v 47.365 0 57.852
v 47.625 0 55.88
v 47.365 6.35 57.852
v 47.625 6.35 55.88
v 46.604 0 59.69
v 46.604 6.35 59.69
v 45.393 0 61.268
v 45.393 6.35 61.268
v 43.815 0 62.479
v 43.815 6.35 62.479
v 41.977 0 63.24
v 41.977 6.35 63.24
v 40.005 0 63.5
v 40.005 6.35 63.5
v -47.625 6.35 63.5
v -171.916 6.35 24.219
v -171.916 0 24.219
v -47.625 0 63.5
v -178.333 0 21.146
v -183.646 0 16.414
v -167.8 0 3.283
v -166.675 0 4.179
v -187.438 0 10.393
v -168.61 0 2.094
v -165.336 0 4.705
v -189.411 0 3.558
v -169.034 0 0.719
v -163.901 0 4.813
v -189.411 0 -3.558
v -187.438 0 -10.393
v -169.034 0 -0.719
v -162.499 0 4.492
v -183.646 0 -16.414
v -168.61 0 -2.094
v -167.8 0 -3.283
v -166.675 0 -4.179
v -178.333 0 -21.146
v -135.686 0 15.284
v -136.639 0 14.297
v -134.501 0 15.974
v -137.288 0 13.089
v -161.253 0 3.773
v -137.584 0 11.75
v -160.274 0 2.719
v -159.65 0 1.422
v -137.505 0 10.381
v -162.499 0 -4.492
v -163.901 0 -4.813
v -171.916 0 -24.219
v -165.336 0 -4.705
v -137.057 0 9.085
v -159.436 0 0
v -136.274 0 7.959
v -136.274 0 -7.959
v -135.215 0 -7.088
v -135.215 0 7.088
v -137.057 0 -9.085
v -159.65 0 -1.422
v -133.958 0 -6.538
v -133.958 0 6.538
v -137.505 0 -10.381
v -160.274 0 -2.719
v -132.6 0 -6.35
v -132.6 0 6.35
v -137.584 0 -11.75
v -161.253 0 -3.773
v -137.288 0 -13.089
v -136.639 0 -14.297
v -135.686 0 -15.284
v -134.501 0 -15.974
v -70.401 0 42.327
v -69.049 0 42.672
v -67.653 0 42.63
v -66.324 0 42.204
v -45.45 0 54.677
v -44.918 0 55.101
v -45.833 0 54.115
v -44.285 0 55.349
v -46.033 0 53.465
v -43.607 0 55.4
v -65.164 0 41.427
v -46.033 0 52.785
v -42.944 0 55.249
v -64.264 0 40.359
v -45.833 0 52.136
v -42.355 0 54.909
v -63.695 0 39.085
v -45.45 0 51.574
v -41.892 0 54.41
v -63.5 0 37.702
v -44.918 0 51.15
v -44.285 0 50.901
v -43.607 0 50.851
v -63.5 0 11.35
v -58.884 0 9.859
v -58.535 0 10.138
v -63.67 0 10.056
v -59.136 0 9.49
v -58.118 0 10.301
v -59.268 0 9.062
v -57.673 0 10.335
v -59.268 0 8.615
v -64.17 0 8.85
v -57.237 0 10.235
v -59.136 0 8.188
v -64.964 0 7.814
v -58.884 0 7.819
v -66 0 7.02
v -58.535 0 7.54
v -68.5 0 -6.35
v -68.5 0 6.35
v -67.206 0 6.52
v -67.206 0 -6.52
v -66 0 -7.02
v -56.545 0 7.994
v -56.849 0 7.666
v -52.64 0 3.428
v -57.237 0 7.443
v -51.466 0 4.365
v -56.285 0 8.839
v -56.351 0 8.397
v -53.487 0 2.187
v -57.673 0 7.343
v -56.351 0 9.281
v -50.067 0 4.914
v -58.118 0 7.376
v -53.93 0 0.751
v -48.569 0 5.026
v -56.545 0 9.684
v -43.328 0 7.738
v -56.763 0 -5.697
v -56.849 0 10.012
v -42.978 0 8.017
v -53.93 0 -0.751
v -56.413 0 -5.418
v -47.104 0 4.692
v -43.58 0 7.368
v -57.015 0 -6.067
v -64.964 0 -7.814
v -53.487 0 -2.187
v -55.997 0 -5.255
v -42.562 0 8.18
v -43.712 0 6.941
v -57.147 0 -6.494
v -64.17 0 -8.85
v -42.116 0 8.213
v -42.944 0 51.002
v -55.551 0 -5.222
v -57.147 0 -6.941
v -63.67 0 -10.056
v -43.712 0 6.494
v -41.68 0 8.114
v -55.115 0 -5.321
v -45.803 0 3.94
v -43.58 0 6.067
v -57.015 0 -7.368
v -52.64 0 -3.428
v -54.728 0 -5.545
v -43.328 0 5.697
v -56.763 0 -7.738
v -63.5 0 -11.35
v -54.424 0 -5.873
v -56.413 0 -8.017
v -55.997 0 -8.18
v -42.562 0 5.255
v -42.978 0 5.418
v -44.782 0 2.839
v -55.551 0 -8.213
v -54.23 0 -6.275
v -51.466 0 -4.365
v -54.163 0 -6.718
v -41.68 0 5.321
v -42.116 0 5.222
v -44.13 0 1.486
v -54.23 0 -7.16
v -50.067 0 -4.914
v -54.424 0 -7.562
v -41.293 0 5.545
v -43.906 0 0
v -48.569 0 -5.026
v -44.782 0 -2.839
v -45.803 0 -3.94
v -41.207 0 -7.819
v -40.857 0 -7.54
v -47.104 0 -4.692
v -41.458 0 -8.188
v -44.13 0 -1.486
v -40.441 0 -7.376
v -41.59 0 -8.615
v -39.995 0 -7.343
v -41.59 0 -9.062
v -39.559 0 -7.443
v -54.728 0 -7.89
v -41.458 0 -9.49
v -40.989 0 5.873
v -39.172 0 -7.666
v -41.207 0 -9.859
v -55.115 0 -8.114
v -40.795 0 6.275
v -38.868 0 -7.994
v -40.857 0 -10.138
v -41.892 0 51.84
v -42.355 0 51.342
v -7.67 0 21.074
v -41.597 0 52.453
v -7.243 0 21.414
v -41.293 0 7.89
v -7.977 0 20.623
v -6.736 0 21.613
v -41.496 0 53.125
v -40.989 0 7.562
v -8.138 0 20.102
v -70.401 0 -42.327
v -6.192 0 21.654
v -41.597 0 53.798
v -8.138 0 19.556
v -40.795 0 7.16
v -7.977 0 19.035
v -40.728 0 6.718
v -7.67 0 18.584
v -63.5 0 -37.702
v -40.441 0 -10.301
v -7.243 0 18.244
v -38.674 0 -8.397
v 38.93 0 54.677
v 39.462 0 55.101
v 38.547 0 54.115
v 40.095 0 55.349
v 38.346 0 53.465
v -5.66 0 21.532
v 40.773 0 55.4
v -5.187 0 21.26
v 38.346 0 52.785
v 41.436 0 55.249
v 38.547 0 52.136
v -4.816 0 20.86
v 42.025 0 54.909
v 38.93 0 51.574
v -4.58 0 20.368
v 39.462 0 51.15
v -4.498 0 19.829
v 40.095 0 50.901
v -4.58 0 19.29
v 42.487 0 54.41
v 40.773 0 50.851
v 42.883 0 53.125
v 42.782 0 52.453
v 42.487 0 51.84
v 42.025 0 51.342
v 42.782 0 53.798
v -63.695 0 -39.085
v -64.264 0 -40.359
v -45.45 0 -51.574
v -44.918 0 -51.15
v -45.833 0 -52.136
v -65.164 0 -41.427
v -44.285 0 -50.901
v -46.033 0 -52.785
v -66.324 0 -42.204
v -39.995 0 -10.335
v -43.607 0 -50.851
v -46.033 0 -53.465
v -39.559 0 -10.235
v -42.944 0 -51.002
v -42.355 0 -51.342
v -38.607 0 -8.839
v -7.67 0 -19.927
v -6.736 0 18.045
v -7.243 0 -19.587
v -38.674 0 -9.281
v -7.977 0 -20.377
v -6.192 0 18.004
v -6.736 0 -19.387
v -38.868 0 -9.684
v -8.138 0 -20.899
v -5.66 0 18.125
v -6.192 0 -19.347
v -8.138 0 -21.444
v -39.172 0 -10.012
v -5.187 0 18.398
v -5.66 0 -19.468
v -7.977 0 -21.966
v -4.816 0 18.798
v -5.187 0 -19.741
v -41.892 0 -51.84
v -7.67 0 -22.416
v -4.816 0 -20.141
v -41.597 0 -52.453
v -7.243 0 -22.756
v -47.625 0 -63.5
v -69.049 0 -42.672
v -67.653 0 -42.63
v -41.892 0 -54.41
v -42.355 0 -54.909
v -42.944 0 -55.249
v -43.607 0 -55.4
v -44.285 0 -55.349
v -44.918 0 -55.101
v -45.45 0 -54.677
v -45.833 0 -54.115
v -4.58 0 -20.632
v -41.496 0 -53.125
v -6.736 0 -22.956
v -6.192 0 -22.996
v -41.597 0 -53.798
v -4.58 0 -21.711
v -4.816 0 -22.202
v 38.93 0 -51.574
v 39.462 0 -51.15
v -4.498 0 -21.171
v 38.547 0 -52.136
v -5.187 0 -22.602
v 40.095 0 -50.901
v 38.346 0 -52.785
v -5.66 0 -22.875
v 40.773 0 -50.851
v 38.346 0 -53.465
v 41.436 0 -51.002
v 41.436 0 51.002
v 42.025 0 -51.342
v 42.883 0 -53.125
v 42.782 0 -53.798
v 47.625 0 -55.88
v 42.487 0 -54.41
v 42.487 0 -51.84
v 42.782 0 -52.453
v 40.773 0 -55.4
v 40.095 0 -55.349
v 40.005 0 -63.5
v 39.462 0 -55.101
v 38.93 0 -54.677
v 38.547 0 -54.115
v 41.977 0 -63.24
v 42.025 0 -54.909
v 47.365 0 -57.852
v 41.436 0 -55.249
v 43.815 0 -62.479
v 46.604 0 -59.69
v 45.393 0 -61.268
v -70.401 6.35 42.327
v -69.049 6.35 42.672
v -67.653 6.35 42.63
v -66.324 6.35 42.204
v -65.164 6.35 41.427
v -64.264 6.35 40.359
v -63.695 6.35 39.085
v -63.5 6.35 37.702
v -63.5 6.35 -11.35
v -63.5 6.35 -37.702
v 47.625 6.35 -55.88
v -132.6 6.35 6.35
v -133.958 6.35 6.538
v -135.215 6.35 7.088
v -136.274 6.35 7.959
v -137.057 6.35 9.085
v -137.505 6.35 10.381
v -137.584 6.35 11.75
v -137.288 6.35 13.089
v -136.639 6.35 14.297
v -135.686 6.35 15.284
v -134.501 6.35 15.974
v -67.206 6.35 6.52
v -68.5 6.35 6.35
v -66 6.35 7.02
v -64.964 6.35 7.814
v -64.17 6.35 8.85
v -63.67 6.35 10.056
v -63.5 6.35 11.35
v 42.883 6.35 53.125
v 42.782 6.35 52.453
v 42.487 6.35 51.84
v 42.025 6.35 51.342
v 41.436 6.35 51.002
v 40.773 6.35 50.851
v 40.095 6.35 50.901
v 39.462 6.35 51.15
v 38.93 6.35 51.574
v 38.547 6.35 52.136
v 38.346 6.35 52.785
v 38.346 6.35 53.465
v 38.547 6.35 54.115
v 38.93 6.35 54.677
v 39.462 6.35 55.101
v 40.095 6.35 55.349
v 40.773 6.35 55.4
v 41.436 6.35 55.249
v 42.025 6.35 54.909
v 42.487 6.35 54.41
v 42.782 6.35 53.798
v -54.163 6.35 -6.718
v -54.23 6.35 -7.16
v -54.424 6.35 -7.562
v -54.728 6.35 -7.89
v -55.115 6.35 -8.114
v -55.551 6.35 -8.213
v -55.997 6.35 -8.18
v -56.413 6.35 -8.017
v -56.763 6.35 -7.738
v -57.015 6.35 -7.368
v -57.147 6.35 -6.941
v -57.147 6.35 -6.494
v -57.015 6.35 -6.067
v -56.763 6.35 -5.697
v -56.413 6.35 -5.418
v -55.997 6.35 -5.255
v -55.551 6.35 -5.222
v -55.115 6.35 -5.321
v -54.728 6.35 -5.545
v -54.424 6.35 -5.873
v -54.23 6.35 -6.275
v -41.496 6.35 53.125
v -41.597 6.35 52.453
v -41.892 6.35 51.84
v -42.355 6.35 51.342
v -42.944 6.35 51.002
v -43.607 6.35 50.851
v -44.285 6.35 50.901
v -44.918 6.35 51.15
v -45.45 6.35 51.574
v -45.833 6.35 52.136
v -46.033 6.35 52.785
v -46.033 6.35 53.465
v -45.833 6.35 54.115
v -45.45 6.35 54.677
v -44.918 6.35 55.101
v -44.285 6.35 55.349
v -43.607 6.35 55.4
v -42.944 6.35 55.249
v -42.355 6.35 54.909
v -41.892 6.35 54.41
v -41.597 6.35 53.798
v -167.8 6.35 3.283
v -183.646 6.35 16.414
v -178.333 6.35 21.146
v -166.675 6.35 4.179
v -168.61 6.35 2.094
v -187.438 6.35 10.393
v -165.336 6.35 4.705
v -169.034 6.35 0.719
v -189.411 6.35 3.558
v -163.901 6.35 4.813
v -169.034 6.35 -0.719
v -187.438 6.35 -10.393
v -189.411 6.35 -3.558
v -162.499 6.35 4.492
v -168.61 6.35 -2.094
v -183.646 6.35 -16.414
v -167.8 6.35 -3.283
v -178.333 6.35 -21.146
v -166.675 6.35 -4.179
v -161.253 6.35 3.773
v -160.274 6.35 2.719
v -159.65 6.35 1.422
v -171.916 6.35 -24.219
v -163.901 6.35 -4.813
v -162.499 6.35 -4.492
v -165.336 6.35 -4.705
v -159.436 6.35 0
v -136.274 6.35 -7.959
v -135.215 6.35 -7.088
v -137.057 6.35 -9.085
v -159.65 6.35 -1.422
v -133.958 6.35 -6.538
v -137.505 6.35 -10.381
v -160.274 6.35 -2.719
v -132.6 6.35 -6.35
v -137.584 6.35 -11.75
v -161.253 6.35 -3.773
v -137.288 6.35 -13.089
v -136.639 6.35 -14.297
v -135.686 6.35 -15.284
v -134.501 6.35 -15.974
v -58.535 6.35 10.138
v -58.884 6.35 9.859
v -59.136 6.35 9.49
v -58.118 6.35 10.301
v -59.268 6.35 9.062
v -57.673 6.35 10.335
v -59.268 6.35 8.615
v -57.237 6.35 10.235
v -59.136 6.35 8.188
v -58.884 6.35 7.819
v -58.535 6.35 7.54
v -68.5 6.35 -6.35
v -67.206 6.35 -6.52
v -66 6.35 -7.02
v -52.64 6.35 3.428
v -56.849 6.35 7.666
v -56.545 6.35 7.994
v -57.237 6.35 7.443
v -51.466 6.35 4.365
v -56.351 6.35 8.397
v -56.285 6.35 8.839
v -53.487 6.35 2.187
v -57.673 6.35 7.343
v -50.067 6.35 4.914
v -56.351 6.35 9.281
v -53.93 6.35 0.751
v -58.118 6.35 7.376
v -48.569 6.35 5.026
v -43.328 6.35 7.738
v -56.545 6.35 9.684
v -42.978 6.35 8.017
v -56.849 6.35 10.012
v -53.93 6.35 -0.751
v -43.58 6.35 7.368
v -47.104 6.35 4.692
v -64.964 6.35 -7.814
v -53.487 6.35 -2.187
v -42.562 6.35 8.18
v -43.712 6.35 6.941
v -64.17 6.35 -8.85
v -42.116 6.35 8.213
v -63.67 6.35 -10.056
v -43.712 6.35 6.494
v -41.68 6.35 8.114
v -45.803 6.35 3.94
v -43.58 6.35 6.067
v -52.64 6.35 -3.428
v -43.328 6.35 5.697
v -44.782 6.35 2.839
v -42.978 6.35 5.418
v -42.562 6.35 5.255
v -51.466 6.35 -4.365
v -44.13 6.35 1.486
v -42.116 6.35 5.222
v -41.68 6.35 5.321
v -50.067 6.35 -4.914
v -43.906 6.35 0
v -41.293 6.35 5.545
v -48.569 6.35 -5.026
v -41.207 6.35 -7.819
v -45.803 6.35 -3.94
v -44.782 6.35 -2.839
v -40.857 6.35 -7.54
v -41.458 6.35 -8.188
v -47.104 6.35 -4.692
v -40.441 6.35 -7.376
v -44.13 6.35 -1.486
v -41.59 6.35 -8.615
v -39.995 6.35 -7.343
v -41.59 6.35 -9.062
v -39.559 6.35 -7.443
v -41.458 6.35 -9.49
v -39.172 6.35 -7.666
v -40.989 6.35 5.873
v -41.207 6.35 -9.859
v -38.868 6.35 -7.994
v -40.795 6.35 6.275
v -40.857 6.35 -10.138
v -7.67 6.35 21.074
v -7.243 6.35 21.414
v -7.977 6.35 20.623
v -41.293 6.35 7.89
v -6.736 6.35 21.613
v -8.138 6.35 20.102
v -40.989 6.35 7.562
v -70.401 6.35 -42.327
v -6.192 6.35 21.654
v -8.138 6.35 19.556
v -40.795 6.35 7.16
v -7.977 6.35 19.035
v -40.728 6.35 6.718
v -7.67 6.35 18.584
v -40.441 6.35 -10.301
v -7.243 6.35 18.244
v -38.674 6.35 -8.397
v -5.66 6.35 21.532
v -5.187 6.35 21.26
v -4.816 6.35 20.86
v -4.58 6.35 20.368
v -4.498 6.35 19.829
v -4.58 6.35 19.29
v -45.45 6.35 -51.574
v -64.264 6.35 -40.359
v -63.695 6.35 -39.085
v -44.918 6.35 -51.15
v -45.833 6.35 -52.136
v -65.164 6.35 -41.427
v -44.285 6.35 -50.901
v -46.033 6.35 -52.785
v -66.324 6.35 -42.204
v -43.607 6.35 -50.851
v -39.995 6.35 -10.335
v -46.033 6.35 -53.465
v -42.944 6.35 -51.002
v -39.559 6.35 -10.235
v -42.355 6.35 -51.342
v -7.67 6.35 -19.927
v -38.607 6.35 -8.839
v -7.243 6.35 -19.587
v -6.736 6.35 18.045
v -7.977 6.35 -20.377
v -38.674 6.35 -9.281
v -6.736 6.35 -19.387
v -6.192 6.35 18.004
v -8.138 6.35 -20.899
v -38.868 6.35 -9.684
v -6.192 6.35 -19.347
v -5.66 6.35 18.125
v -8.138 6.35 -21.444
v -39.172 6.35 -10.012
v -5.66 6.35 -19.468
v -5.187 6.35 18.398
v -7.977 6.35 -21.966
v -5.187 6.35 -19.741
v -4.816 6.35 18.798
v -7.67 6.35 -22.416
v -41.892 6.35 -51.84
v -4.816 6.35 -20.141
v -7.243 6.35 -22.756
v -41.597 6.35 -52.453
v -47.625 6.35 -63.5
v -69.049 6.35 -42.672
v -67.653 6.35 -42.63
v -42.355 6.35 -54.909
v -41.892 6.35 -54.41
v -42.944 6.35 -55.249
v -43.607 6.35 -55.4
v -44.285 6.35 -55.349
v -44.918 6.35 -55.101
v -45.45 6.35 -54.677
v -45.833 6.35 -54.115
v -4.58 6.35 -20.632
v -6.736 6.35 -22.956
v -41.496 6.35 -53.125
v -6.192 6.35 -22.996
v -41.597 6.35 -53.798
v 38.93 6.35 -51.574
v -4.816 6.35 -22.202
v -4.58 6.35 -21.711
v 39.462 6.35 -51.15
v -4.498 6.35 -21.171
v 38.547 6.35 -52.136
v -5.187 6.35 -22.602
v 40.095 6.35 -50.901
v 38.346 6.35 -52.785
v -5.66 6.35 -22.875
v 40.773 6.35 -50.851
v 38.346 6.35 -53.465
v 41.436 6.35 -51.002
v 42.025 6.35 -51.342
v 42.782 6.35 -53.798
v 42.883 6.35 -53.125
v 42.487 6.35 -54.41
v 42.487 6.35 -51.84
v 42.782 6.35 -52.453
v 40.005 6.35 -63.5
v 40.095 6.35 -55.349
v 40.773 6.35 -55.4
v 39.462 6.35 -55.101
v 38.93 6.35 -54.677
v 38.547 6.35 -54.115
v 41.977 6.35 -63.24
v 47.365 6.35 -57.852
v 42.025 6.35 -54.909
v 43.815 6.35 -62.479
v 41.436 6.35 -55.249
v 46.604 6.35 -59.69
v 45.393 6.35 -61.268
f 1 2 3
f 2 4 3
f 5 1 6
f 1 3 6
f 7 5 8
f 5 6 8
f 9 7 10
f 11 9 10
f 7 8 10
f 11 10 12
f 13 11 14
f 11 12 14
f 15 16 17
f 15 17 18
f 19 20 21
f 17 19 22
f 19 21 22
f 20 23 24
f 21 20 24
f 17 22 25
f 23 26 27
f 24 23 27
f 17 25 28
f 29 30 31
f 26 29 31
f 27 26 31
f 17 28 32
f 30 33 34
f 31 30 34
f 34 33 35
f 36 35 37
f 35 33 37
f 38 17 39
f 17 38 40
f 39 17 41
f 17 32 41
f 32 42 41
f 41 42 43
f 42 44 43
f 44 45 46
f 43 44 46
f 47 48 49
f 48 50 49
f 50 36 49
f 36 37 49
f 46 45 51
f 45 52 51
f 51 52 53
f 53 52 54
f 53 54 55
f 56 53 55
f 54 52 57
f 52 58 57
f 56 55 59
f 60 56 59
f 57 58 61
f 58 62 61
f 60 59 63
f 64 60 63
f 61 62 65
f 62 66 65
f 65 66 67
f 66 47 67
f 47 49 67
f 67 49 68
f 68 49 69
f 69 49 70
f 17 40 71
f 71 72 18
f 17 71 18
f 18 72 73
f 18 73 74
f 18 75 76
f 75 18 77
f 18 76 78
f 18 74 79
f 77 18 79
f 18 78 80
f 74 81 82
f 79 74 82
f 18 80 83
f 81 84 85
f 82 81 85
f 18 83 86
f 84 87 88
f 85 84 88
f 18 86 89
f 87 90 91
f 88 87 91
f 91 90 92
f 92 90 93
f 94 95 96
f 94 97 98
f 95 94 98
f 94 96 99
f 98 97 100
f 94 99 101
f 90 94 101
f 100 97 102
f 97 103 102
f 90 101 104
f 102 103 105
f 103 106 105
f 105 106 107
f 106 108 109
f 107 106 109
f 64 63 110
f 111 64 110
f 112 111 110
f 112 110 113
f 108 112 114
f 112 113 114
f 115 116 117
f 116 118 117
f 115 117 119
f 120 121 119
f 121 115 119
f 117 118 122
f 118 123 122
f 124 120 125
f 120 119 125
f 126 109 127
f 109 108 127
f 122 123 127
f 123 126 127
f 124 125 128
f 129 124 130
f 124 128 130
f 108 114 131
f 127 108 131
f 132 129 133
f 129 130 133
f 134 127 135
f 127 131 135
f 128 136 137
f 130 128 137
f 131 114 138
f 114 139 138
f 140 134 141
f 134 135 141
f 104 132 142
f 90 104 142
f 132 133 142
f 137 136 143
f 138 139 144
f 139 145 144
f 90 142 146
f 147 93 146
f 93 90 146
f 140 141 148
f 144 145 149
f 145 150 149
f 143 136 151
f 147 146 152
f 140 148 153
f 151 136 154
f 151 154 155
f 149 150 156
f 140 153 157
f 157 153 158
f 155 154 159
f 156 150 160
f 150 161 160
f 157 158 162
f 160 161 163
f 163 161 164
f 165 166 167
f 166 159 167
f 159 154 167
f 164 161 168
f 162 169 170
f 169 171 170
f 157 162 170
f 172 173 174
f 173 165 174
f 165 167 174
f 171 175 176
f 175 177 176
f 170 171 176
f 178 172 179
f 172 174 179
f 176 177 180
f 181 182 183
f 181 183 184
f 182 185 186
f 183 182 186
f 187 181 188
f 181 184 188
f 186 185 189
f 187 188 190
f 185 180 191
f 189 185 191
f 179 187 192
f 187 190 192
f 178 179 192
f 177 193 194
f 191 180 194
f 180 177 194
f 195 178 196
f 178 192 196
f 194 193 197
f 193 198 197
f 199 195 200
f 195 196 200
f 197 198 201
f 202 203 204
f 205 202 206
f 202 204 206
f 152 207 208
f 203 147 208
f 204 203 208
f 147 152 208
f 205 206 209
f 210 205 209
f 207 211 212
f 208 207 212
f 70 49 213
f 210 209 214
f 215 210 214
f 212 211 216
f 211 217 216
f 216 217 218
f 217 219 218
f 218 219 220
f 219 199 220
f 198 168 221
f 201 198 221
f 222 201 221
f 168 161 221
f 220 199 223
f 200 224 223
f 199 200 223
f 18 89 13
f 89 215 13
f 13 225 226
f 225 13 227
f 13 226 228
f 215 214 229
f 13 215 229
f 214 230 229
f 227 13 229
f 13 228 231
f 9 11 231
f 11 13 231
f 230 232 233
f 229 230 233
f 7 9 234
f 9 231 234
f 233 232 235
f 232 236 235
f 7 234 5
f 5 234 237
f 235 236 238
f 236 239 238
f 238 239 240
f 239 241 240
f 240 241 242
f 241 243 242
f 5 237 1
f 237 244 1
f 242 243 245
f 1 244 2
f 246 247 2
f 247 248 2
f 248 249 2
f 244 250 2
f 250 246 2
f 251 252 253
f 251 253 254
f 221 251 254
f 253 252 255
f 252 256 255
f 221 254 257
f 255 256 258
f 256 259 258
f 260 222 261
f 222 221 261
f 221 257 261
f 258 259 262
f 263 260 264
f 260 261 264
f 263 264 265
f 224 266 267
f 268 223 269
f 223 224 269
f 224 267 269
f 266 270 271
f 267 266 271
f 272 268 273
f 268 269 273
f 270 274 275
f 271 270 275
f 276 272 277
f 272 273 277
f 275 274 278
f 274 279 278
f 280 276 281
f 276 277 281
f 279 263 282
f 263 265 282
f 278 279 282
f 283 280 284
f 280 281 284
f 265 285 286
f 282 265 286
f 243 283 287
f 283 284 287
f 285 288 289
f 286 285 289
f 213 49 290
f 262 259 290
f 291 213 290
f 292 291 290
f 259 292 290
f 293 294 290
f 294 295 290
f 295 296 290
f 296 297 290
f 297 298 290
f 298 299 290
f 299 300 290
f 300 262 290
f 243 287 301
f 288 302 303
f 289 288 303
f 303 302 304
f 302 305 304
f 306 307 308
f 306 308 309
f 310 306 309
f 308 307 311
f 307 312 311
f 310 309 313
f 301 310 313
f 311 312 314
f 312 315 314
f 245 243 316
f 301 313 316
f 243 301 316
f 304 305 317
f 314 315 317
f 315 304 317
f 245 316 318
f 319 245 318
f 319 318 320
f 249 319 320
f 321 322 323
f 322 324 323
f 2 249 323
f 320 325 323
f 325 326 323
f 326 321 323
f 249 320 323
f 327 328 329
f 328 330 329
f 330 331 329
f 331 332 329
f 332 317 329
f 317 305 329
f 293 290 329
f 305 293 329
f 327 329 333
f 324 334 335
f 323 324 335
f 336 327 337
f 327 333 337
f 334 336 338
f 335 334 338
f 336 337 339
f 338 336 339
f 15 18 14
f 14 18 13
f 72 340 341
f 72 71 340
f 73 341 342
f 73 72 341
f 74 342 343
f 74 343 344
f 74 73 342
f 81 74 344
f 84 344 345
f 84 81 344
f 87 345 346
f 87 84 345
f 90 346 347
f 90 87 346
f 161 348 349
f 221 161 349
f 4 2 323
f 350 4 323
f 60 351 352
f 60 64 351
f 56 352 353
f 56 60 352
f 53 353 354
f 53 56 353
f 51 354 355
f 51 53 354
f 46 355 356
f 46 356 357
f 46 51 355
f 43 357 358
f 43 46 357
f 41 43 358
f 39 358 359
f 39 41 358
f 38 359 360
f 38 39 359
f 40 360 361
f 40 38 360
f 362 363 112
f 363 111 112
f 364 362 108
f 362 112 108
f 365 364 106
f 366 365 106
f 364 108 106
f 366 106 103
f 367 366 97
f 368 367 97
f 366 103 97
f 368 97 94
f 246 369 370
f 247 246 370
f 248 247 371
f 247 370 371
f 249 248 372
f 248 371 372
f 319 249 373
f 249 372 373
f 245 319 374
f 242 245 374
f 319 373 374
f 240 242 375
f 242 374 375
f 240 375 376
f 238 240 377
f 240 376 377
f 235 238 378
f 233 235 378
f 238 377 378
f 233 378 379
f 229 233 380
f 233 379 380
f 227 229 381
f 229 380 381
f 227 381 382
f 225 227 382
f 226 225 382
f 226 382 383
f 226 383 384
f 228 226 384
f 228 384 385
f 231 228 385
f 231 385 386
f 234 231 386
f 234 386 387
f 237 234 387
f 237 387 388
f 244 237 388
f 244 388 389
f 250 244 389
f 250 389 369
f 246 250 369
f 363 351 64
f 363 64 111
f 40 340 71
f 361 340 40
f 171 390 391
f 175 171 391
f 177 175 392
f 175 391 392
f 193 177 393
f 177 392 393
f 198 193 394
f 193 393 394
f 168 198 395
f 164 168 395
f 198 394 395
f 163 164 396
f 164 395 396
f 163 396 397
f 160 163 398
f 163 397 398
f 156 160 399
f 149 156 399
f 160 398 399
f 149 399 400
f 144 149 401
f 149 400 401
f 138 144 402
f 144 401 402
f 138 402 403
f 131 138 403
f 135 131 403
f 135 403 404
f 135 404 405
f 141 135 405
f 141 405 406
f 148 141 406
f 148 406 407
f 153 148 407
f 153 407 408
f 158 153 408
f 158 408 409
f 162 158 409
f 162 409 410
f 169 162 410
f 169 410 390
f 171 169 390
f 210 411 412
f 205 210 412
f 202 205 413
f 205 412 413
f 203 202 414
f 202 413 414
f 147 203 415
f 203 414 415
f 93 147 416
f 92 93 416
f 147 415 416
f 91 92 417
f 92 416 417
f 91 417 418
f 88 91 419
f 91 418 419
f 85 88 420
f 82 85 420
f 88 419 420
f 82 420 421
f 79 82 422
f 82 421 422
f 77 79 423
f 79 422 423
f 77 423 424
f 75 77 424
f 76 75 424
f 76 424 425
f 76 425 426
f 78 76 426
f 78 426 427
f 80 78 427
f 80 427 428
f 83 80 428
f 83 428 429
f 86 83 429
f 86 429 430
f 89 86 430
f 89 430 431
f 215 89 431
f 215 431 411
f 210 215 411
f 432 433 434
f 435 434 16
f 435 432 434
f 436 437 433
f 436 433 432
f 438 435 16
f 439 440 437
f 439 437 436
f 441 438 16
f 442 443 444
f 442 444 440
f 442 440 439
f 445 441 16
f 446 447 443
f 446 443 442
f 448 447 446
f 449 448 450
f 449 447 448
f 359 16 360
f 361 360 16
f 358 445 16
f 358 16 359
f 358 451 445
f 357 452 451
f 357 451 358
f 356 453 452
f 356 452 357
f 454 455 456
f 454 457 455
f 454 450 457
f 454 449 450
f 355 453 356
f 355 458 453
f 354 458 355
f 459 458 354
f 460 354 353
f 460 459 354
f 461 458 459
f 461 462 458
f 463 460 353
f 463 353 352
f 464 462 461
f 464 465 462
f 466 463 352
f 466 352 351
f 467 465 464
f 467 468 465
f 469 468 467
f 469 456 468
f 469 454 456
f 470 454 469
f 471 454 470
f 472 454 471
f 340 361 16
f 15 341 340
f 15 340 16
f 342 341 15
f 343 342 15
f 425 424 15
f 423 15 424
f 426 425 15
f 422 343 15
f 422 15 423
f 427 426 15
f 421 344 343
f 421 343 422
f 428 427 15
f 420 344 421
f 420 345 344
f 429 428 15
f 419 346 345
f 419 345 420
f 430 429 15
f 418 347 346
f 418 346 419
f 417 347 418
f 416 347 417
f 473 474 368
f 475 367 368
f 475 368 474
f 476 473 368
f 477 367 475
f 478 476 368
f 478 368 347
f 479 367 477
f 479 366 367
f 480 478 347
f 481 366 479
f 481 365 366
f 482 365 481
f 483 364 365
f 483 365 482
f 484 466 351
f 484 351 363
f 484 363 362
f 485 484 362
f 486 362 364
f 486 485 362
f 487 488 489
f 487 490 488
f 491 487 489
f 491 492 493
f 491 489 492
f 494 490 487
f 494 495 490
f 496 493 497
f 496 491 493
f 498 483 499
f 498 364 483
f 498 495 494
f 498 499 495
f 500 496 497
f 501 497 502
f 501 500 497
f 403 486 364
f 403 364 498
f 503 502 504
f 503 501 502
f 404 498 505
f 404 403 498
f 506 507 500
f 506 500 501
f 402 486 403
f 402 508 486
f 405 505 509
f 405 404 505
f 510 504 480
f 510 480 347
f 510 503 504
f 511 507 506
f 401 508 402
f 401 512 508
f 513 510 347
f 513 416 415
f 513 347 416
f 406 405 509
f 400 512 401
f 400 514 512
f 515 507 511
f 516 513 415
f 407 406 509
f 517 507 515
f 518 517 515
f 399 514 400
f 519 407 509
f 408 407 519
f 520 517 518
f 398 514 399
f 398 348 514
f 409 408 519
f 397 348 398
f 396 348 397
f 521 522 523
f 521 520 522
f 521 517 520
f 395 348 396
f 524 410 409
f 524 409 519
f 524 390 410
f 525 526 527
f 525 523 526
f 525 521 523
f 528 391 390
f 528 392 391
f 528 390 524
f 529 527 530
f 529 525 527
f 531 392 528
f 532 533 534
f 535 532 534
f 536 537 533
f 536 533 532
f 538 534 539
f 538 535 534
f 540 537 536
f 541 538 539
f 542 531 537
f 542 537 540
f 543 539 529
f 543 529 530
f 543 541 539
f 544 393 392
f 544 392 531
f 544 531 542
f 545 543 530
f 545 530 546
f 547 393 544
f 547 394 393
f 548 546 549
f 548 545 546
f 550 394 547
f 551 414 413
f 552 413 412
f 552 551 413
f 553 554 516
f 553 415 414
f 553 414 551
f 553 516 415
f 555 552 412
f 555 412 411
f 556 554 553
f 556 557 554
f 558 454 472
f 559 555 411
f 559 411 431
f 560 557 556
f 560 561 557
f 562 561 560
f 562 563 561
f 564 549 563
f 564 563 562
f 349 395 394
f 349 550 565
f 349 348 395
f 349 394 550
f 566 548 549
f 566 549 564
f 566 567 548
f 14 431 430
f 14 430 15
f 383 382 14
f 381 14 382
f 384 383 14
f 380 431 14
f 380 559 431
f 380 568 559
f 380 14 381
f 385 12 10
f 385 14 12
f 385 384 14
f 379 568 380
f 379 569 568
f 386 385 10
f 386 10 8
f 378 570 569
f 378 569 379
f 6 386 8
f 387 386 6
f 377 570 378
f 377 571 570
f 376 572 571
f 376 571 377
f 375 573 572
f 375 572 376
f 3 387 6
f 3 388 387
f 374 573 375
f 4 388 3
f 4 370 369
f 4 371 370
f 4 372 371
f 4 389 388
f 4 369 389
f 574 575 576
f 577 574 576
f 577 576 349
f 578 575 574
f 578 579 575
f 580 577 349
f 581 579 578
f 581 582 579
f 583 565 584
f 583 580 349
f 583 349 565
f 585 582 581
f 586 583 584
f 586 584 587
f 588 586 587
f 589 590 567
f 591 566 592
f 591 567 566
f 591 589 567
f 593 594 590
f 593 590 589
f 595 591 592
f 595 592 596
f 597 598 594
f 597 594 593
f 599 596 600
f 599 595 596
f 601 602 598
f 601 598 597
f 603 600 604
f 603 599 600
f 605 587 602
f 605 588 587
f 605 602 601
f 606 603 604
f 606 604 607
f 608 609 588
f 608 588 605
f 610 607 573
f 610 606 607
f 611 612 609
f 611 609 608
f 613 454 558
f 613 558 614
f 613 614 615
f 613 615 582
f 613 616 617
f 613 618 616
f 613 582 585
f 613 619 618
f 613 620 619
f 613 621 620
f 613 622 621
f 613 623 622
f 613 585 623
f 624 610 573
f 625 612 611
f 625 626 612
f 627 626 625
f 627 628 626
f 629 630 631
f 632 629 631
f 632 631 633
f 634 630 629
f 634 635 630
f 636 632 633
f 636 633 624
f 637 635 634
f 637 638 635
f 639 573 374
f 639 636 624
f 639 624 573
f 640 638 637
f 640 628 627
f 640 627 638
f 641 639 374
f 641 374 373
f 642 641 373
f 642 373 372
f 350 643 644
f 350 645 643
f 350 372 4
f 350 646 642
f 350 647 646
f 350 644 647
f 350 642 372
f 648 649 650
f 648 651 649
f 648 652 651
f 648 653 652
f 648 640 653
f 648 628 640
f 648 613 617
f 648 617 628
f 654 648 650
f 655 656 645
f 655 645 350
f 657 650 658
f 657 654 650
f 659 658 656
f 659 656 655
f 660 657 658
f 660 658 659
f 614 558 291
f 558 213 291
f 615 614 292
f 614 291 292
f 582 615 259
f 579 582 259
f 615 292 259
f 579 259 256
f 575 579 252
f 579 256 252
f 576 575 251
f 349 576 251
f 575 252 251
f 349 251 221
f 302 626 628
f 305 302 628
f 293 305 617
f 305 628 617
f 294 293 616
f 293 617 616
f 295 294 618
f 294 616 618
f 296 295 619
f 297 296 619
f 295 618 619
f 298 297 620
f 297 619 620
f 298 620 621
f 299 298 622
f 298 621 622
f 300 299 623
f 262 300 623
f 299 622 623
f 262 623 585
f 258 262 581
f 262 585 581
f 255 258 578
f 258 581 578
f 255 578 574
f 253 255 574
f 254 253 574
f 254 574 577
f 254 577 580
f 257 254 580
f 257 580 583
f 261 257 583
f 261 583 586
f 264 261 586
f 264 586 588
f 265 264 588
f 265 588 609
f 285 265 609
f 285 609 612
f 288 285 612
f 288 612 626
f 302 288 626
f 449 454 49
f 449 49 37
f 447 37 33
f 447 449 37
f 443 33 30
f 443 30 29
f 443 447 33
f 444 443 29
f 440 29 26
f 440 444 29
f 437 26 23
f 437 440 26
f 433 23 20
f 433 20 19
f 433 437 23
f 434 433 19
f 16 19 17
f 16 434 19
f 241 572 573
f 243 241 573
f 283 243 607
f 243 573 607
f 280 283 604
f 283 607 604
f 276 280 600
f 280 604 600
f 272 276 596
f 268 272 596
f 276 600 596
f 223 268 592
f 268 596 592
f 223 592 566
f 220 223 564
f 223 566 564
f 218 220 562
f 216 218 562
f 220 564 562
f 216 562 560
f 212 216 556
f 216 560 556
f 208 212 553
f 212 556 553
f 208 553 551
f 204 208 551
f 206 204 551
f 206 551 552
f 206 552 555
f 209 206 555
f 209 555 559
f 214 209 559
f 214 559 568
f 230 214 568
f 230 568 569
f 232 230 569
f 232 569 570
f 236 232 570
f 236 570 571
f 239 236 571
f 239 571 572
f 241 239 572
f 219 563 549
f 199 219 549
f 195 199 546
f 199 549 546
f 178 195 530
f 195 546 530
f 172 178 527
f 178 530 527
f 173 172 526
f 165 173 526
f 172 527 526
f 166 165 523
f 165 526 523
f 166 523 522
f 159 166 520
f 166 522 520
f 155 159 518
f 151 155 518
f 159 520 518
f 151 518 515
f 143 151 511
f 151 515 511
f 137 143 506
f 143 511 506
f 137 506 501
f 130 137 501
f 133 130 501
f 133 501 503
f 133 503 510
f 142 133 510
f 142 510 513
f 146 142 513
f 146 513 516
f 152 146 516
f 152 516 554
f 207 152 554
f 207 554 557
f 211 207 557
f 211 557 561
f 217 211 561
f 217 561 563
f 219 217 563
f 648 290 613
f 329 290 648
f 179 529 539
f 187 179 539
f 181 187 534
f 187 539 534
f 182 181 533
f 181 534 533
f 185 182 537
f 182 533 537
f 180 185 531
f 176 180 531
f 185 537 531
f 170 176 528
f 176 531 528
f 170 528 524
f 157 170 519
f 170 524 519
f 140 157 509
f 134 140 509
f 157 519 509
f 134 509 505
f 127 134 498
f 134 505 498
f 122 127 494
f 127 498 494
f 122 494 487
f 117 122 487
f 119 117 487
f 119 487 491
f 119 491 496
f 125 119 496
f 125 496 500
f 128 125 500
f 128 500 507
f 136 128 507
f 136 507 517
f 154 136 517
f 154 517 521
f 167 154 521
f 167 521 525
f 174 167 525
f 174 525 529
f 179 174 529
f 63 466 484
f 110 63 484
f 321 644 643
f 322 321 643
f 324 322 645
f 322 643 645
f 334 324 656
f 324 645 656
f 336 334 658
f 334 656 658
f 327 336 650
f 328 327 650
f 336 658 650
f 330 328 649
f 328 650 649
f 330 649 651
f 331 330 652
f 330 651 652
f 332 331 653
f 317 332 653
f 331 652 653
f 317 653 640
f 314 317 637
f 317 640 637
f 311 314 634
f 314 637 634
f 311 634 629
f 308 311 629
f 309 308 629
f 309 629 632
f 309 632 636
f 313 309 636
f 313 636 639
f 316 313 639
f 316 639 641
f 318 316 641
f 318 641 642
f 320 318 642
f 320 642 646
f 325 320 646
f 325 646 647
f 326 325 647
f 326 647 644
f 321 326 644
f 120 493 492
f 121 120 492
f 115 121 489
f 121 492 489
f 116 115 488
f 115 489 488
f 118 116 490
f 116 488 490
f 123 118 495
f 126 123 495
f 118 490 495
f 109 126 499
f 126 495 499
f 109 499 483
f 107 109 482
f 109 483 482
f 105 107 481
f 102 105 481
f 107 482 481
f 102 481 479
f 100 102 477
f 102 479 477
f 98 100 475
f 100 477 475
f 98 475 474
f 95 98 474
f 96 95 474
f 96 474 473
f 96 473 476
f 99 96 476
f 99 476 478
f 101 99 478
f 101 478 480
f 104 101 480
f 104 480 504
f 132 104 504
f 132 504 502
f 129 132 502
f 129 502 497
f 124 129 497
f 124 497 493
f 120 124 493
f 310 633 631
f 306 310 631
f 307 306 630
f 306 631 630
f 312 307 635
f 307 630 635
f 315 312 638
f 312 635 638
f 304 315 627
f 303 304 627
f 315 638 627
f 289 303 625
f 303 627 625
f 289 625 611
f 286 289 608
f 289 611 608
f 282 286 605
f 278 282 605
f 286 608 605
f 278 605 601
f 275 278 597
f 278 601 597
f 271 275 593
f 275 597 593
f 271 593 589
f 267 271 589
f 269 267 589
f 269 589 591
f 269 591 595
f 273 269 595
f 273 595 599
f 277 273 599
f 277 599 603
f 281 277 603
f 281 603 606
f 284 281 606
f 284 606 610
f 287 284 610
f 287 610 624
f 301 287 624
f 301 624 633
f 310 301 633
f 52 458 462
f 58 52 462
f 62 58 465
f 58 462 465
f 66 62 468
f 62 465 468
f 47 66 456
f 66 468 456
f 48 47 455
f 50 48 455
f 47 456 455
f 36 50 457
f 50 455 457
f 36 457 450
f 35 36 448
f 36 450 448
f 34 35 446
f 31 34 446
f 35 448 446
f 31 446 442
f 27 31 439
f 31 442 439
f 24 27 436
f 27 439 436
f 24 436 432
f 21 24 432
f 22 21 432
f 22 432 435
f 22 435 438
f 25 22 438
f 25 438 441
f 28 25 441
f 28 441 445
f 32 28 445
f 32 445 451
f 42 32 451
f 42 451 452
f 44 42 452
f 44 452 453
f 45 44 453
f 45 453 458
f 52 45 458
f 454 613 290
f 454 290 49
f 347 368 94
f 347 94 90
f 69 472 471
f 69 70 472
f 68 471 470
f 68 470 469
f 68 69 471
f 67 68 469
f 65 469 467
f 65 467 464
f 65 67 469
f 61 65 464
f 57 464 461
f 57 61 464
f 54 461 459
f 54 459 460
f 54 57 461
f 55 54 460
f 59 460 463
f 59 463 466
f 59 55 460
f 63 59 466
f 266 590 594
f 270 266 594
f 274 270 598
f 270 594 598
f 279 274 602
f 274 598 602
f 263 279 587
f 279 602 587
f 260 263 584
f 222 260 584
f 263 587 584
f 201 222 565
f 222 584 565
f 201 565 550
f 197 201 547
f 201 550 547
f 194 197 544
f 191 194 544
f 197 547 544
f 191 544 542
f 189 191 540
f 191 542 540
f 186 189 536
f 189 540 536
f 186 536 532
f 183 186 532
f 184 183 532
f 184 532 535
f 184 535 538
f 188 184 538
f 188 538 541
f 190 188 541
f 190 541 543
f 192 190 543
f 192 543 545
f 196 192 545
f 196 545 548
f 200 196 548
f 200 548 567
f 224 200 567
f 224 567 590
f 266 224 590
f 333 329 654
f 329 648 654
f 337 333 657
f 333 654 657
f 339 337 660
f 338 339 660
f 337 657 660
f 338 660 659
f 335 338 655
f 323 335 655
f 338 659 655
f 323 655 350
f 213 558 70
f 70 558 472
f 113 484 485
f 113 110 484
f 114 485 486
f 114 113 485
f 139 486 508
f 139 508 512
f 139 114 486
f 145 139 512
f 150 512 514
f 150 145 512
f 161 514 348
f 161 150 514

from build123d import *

# Parameters (mm, degrees)
SKETCH1_W           = 95.25
SKETCH1_H           = 127
BOSS_EXTRUDE1_DEPTH = 6.35
BOSS_EXTRUDE3_DEPTH = 6.35
SKETCH5_R           = 4.826
SKETCH5_R_2         = 5.039999953
SKETCH5_R_3         = 1.5
CUT_EXTRUDE1_DEPTH  = 7.35
CUT_EXTRUDE2_DEPTH  = 7.35
FILLET9_R           = 5
FILLET10_R          = 7.62
SKETCH7_R           = 2.2812375
CUT_EXTRUDE3_DEPTH  = 7.35
SKETCH8_R           = 1.830008083
CUT_EXTRUDE4_DEPTH  = 7.35


with BuildPart() as part:
    # Sketch1 → Boss-Extrude1 (new body)
    with BuildSketch(Plane(origin=(0, 0, 0), x_dir=(1, 0, 0), z_dir=(0, 1, 0))):
        Rectangle(SKETCH1_W, SKETCH1_H)
    extrude(amount=BOSS_EXTRUDE1_DEPTH)

    # Sketch4 → Boss-Extrude3 (add)
    with BuildSketch(Plane(origin=(0, 6.35, 0), x_dir=(1, 0, 0), z_dir=(0, 1, 0))):
        with BuildLine():
            Line((-47.625, 63.5), (-171.916018217, 24.219268021))
            ThreePointArc((-171.916018217, 24.219268021), (-189.6618, 0), (-171.916018217, -24.219268021))
            Line((-171.916018217, -24.219268021), (-47.625, -63.5))
            Line((-47.625, -63.5), (-47.625, 63.5))
        make_face()
    extrude(amount=-BOSS_EXTRUDE3_DEPTH)

    # Sketch5 → Cut-Extrude1 (cut, through all)
    with BuildSketch(Plane(origin=(0, 6.35, 0), x_dir=(1, 0, 0), z_dir=(0, 1, 0))):
        with Locations((-164.2618, 0)):
            Circle(SKETCH5_R)
        with Locations((-48.9458, 0)):
            Circle(SKETCH5_R_2)
        with Locations((-40.106965235, 8.838834765)):
            Circle(SKETCH5_R_3)
        with Locations((-57.784634765, -8.838834765)):
            Circle(SKETCH5_R_3)
        with Locations((-55.663314421, 6.717514421)):
            Circle(SKETCH5_R_3)
        with Locations((-42.228285579, -6.717514421)):
            Circle(SKETCH5_R_3)
    extrude(amount=-CUT_EXTRUDE1_DEPTH, mode=Mode.SUBTRACT)

    # Sketch6 → Cut-Extrude2 (cut, through all)
    with BuildSketch(Plane(origin=(0, 6.35, 0), x_dir=(1, 0, 0), z_dir=(0, 1, 0))):
        Polygon((-63.5, 45.163743355), (-157.9118, 6.35), (-63.5, 6.35), align=None)
        Polygon((-63.5, -6.35), (-63.5, -45.163743355), (-157.9118, -6.35), align=None)
    extrude(amount=-CUT_EXTRUDE2_DEPTH, mode=Mode.SUBTRACT)

    # Fillet9
    fillet9_edges = [part.edges().sort_by_distance(p)[0] for p in [
        (-63.5, 3.175, -45.163743355),
        (-63.5, 3.175, -6.35),
        (-157.9118, 3.175, -6.35),
        (-157.9118, 3.175, 6.35),
        (-63.5, 3.175, 6.35),
        (-63.5, 3.175, 45.163743355),
    ]]
    fillet(fillet9_edges, radius=FILLET9_R)

    # Fillet10
    fillet10_edges = [part.edges().sort_by_distance(p)[0] for p in [
        (47.625, 3.175, 63.5),
        (47.625, 3.175, -63.5),
    ]]
    fillet(fillet10_edges, radius=FILLET10_R)

    # Sketch7 → Cut-Extrude3 (cut, through all)
    with BuildSketch(Plane(origin=(0, 6.35, 0), x_dir=(1, 0, 0), z_dir=(0, 1, 0))):
        with Locations((-43.777254611, -53.125383493)):
            Circle(SKETCH7_R)
        with Locations((-43.777254611, 53.125383493)):
            Circle(SKETCH7_R)
        with Locations((40.602254611, 53.125383493)):
            Circle(SKETCH7_R)
        with Locations((40.602254611, -53.125383493)):
            Circle(SKETCH7_R)
    extrude(amount=-CUT_EXTRUDE3_DEPTH, mode=Mode.SUBTRACT)

    # Sketch8 → Cut-Extrude4 (cut, through all)
    with BuildSketch(Plane(origin=(0, 6.35, 0), x_dir=(1, 0, 0), z_dir=(0, 1, 0))):
        with Locations((-6.328465047, -19.828924843)):
            Circle(SKETCH8_R)
        with Locations((-6.328338046, 21.171490961)):
            Circle(SKETCH8_R)
    extrude(amount=-CUT_EXTRUDE4_DEPTH, mode=Mode.SUBTRACT)


solid = part.part
